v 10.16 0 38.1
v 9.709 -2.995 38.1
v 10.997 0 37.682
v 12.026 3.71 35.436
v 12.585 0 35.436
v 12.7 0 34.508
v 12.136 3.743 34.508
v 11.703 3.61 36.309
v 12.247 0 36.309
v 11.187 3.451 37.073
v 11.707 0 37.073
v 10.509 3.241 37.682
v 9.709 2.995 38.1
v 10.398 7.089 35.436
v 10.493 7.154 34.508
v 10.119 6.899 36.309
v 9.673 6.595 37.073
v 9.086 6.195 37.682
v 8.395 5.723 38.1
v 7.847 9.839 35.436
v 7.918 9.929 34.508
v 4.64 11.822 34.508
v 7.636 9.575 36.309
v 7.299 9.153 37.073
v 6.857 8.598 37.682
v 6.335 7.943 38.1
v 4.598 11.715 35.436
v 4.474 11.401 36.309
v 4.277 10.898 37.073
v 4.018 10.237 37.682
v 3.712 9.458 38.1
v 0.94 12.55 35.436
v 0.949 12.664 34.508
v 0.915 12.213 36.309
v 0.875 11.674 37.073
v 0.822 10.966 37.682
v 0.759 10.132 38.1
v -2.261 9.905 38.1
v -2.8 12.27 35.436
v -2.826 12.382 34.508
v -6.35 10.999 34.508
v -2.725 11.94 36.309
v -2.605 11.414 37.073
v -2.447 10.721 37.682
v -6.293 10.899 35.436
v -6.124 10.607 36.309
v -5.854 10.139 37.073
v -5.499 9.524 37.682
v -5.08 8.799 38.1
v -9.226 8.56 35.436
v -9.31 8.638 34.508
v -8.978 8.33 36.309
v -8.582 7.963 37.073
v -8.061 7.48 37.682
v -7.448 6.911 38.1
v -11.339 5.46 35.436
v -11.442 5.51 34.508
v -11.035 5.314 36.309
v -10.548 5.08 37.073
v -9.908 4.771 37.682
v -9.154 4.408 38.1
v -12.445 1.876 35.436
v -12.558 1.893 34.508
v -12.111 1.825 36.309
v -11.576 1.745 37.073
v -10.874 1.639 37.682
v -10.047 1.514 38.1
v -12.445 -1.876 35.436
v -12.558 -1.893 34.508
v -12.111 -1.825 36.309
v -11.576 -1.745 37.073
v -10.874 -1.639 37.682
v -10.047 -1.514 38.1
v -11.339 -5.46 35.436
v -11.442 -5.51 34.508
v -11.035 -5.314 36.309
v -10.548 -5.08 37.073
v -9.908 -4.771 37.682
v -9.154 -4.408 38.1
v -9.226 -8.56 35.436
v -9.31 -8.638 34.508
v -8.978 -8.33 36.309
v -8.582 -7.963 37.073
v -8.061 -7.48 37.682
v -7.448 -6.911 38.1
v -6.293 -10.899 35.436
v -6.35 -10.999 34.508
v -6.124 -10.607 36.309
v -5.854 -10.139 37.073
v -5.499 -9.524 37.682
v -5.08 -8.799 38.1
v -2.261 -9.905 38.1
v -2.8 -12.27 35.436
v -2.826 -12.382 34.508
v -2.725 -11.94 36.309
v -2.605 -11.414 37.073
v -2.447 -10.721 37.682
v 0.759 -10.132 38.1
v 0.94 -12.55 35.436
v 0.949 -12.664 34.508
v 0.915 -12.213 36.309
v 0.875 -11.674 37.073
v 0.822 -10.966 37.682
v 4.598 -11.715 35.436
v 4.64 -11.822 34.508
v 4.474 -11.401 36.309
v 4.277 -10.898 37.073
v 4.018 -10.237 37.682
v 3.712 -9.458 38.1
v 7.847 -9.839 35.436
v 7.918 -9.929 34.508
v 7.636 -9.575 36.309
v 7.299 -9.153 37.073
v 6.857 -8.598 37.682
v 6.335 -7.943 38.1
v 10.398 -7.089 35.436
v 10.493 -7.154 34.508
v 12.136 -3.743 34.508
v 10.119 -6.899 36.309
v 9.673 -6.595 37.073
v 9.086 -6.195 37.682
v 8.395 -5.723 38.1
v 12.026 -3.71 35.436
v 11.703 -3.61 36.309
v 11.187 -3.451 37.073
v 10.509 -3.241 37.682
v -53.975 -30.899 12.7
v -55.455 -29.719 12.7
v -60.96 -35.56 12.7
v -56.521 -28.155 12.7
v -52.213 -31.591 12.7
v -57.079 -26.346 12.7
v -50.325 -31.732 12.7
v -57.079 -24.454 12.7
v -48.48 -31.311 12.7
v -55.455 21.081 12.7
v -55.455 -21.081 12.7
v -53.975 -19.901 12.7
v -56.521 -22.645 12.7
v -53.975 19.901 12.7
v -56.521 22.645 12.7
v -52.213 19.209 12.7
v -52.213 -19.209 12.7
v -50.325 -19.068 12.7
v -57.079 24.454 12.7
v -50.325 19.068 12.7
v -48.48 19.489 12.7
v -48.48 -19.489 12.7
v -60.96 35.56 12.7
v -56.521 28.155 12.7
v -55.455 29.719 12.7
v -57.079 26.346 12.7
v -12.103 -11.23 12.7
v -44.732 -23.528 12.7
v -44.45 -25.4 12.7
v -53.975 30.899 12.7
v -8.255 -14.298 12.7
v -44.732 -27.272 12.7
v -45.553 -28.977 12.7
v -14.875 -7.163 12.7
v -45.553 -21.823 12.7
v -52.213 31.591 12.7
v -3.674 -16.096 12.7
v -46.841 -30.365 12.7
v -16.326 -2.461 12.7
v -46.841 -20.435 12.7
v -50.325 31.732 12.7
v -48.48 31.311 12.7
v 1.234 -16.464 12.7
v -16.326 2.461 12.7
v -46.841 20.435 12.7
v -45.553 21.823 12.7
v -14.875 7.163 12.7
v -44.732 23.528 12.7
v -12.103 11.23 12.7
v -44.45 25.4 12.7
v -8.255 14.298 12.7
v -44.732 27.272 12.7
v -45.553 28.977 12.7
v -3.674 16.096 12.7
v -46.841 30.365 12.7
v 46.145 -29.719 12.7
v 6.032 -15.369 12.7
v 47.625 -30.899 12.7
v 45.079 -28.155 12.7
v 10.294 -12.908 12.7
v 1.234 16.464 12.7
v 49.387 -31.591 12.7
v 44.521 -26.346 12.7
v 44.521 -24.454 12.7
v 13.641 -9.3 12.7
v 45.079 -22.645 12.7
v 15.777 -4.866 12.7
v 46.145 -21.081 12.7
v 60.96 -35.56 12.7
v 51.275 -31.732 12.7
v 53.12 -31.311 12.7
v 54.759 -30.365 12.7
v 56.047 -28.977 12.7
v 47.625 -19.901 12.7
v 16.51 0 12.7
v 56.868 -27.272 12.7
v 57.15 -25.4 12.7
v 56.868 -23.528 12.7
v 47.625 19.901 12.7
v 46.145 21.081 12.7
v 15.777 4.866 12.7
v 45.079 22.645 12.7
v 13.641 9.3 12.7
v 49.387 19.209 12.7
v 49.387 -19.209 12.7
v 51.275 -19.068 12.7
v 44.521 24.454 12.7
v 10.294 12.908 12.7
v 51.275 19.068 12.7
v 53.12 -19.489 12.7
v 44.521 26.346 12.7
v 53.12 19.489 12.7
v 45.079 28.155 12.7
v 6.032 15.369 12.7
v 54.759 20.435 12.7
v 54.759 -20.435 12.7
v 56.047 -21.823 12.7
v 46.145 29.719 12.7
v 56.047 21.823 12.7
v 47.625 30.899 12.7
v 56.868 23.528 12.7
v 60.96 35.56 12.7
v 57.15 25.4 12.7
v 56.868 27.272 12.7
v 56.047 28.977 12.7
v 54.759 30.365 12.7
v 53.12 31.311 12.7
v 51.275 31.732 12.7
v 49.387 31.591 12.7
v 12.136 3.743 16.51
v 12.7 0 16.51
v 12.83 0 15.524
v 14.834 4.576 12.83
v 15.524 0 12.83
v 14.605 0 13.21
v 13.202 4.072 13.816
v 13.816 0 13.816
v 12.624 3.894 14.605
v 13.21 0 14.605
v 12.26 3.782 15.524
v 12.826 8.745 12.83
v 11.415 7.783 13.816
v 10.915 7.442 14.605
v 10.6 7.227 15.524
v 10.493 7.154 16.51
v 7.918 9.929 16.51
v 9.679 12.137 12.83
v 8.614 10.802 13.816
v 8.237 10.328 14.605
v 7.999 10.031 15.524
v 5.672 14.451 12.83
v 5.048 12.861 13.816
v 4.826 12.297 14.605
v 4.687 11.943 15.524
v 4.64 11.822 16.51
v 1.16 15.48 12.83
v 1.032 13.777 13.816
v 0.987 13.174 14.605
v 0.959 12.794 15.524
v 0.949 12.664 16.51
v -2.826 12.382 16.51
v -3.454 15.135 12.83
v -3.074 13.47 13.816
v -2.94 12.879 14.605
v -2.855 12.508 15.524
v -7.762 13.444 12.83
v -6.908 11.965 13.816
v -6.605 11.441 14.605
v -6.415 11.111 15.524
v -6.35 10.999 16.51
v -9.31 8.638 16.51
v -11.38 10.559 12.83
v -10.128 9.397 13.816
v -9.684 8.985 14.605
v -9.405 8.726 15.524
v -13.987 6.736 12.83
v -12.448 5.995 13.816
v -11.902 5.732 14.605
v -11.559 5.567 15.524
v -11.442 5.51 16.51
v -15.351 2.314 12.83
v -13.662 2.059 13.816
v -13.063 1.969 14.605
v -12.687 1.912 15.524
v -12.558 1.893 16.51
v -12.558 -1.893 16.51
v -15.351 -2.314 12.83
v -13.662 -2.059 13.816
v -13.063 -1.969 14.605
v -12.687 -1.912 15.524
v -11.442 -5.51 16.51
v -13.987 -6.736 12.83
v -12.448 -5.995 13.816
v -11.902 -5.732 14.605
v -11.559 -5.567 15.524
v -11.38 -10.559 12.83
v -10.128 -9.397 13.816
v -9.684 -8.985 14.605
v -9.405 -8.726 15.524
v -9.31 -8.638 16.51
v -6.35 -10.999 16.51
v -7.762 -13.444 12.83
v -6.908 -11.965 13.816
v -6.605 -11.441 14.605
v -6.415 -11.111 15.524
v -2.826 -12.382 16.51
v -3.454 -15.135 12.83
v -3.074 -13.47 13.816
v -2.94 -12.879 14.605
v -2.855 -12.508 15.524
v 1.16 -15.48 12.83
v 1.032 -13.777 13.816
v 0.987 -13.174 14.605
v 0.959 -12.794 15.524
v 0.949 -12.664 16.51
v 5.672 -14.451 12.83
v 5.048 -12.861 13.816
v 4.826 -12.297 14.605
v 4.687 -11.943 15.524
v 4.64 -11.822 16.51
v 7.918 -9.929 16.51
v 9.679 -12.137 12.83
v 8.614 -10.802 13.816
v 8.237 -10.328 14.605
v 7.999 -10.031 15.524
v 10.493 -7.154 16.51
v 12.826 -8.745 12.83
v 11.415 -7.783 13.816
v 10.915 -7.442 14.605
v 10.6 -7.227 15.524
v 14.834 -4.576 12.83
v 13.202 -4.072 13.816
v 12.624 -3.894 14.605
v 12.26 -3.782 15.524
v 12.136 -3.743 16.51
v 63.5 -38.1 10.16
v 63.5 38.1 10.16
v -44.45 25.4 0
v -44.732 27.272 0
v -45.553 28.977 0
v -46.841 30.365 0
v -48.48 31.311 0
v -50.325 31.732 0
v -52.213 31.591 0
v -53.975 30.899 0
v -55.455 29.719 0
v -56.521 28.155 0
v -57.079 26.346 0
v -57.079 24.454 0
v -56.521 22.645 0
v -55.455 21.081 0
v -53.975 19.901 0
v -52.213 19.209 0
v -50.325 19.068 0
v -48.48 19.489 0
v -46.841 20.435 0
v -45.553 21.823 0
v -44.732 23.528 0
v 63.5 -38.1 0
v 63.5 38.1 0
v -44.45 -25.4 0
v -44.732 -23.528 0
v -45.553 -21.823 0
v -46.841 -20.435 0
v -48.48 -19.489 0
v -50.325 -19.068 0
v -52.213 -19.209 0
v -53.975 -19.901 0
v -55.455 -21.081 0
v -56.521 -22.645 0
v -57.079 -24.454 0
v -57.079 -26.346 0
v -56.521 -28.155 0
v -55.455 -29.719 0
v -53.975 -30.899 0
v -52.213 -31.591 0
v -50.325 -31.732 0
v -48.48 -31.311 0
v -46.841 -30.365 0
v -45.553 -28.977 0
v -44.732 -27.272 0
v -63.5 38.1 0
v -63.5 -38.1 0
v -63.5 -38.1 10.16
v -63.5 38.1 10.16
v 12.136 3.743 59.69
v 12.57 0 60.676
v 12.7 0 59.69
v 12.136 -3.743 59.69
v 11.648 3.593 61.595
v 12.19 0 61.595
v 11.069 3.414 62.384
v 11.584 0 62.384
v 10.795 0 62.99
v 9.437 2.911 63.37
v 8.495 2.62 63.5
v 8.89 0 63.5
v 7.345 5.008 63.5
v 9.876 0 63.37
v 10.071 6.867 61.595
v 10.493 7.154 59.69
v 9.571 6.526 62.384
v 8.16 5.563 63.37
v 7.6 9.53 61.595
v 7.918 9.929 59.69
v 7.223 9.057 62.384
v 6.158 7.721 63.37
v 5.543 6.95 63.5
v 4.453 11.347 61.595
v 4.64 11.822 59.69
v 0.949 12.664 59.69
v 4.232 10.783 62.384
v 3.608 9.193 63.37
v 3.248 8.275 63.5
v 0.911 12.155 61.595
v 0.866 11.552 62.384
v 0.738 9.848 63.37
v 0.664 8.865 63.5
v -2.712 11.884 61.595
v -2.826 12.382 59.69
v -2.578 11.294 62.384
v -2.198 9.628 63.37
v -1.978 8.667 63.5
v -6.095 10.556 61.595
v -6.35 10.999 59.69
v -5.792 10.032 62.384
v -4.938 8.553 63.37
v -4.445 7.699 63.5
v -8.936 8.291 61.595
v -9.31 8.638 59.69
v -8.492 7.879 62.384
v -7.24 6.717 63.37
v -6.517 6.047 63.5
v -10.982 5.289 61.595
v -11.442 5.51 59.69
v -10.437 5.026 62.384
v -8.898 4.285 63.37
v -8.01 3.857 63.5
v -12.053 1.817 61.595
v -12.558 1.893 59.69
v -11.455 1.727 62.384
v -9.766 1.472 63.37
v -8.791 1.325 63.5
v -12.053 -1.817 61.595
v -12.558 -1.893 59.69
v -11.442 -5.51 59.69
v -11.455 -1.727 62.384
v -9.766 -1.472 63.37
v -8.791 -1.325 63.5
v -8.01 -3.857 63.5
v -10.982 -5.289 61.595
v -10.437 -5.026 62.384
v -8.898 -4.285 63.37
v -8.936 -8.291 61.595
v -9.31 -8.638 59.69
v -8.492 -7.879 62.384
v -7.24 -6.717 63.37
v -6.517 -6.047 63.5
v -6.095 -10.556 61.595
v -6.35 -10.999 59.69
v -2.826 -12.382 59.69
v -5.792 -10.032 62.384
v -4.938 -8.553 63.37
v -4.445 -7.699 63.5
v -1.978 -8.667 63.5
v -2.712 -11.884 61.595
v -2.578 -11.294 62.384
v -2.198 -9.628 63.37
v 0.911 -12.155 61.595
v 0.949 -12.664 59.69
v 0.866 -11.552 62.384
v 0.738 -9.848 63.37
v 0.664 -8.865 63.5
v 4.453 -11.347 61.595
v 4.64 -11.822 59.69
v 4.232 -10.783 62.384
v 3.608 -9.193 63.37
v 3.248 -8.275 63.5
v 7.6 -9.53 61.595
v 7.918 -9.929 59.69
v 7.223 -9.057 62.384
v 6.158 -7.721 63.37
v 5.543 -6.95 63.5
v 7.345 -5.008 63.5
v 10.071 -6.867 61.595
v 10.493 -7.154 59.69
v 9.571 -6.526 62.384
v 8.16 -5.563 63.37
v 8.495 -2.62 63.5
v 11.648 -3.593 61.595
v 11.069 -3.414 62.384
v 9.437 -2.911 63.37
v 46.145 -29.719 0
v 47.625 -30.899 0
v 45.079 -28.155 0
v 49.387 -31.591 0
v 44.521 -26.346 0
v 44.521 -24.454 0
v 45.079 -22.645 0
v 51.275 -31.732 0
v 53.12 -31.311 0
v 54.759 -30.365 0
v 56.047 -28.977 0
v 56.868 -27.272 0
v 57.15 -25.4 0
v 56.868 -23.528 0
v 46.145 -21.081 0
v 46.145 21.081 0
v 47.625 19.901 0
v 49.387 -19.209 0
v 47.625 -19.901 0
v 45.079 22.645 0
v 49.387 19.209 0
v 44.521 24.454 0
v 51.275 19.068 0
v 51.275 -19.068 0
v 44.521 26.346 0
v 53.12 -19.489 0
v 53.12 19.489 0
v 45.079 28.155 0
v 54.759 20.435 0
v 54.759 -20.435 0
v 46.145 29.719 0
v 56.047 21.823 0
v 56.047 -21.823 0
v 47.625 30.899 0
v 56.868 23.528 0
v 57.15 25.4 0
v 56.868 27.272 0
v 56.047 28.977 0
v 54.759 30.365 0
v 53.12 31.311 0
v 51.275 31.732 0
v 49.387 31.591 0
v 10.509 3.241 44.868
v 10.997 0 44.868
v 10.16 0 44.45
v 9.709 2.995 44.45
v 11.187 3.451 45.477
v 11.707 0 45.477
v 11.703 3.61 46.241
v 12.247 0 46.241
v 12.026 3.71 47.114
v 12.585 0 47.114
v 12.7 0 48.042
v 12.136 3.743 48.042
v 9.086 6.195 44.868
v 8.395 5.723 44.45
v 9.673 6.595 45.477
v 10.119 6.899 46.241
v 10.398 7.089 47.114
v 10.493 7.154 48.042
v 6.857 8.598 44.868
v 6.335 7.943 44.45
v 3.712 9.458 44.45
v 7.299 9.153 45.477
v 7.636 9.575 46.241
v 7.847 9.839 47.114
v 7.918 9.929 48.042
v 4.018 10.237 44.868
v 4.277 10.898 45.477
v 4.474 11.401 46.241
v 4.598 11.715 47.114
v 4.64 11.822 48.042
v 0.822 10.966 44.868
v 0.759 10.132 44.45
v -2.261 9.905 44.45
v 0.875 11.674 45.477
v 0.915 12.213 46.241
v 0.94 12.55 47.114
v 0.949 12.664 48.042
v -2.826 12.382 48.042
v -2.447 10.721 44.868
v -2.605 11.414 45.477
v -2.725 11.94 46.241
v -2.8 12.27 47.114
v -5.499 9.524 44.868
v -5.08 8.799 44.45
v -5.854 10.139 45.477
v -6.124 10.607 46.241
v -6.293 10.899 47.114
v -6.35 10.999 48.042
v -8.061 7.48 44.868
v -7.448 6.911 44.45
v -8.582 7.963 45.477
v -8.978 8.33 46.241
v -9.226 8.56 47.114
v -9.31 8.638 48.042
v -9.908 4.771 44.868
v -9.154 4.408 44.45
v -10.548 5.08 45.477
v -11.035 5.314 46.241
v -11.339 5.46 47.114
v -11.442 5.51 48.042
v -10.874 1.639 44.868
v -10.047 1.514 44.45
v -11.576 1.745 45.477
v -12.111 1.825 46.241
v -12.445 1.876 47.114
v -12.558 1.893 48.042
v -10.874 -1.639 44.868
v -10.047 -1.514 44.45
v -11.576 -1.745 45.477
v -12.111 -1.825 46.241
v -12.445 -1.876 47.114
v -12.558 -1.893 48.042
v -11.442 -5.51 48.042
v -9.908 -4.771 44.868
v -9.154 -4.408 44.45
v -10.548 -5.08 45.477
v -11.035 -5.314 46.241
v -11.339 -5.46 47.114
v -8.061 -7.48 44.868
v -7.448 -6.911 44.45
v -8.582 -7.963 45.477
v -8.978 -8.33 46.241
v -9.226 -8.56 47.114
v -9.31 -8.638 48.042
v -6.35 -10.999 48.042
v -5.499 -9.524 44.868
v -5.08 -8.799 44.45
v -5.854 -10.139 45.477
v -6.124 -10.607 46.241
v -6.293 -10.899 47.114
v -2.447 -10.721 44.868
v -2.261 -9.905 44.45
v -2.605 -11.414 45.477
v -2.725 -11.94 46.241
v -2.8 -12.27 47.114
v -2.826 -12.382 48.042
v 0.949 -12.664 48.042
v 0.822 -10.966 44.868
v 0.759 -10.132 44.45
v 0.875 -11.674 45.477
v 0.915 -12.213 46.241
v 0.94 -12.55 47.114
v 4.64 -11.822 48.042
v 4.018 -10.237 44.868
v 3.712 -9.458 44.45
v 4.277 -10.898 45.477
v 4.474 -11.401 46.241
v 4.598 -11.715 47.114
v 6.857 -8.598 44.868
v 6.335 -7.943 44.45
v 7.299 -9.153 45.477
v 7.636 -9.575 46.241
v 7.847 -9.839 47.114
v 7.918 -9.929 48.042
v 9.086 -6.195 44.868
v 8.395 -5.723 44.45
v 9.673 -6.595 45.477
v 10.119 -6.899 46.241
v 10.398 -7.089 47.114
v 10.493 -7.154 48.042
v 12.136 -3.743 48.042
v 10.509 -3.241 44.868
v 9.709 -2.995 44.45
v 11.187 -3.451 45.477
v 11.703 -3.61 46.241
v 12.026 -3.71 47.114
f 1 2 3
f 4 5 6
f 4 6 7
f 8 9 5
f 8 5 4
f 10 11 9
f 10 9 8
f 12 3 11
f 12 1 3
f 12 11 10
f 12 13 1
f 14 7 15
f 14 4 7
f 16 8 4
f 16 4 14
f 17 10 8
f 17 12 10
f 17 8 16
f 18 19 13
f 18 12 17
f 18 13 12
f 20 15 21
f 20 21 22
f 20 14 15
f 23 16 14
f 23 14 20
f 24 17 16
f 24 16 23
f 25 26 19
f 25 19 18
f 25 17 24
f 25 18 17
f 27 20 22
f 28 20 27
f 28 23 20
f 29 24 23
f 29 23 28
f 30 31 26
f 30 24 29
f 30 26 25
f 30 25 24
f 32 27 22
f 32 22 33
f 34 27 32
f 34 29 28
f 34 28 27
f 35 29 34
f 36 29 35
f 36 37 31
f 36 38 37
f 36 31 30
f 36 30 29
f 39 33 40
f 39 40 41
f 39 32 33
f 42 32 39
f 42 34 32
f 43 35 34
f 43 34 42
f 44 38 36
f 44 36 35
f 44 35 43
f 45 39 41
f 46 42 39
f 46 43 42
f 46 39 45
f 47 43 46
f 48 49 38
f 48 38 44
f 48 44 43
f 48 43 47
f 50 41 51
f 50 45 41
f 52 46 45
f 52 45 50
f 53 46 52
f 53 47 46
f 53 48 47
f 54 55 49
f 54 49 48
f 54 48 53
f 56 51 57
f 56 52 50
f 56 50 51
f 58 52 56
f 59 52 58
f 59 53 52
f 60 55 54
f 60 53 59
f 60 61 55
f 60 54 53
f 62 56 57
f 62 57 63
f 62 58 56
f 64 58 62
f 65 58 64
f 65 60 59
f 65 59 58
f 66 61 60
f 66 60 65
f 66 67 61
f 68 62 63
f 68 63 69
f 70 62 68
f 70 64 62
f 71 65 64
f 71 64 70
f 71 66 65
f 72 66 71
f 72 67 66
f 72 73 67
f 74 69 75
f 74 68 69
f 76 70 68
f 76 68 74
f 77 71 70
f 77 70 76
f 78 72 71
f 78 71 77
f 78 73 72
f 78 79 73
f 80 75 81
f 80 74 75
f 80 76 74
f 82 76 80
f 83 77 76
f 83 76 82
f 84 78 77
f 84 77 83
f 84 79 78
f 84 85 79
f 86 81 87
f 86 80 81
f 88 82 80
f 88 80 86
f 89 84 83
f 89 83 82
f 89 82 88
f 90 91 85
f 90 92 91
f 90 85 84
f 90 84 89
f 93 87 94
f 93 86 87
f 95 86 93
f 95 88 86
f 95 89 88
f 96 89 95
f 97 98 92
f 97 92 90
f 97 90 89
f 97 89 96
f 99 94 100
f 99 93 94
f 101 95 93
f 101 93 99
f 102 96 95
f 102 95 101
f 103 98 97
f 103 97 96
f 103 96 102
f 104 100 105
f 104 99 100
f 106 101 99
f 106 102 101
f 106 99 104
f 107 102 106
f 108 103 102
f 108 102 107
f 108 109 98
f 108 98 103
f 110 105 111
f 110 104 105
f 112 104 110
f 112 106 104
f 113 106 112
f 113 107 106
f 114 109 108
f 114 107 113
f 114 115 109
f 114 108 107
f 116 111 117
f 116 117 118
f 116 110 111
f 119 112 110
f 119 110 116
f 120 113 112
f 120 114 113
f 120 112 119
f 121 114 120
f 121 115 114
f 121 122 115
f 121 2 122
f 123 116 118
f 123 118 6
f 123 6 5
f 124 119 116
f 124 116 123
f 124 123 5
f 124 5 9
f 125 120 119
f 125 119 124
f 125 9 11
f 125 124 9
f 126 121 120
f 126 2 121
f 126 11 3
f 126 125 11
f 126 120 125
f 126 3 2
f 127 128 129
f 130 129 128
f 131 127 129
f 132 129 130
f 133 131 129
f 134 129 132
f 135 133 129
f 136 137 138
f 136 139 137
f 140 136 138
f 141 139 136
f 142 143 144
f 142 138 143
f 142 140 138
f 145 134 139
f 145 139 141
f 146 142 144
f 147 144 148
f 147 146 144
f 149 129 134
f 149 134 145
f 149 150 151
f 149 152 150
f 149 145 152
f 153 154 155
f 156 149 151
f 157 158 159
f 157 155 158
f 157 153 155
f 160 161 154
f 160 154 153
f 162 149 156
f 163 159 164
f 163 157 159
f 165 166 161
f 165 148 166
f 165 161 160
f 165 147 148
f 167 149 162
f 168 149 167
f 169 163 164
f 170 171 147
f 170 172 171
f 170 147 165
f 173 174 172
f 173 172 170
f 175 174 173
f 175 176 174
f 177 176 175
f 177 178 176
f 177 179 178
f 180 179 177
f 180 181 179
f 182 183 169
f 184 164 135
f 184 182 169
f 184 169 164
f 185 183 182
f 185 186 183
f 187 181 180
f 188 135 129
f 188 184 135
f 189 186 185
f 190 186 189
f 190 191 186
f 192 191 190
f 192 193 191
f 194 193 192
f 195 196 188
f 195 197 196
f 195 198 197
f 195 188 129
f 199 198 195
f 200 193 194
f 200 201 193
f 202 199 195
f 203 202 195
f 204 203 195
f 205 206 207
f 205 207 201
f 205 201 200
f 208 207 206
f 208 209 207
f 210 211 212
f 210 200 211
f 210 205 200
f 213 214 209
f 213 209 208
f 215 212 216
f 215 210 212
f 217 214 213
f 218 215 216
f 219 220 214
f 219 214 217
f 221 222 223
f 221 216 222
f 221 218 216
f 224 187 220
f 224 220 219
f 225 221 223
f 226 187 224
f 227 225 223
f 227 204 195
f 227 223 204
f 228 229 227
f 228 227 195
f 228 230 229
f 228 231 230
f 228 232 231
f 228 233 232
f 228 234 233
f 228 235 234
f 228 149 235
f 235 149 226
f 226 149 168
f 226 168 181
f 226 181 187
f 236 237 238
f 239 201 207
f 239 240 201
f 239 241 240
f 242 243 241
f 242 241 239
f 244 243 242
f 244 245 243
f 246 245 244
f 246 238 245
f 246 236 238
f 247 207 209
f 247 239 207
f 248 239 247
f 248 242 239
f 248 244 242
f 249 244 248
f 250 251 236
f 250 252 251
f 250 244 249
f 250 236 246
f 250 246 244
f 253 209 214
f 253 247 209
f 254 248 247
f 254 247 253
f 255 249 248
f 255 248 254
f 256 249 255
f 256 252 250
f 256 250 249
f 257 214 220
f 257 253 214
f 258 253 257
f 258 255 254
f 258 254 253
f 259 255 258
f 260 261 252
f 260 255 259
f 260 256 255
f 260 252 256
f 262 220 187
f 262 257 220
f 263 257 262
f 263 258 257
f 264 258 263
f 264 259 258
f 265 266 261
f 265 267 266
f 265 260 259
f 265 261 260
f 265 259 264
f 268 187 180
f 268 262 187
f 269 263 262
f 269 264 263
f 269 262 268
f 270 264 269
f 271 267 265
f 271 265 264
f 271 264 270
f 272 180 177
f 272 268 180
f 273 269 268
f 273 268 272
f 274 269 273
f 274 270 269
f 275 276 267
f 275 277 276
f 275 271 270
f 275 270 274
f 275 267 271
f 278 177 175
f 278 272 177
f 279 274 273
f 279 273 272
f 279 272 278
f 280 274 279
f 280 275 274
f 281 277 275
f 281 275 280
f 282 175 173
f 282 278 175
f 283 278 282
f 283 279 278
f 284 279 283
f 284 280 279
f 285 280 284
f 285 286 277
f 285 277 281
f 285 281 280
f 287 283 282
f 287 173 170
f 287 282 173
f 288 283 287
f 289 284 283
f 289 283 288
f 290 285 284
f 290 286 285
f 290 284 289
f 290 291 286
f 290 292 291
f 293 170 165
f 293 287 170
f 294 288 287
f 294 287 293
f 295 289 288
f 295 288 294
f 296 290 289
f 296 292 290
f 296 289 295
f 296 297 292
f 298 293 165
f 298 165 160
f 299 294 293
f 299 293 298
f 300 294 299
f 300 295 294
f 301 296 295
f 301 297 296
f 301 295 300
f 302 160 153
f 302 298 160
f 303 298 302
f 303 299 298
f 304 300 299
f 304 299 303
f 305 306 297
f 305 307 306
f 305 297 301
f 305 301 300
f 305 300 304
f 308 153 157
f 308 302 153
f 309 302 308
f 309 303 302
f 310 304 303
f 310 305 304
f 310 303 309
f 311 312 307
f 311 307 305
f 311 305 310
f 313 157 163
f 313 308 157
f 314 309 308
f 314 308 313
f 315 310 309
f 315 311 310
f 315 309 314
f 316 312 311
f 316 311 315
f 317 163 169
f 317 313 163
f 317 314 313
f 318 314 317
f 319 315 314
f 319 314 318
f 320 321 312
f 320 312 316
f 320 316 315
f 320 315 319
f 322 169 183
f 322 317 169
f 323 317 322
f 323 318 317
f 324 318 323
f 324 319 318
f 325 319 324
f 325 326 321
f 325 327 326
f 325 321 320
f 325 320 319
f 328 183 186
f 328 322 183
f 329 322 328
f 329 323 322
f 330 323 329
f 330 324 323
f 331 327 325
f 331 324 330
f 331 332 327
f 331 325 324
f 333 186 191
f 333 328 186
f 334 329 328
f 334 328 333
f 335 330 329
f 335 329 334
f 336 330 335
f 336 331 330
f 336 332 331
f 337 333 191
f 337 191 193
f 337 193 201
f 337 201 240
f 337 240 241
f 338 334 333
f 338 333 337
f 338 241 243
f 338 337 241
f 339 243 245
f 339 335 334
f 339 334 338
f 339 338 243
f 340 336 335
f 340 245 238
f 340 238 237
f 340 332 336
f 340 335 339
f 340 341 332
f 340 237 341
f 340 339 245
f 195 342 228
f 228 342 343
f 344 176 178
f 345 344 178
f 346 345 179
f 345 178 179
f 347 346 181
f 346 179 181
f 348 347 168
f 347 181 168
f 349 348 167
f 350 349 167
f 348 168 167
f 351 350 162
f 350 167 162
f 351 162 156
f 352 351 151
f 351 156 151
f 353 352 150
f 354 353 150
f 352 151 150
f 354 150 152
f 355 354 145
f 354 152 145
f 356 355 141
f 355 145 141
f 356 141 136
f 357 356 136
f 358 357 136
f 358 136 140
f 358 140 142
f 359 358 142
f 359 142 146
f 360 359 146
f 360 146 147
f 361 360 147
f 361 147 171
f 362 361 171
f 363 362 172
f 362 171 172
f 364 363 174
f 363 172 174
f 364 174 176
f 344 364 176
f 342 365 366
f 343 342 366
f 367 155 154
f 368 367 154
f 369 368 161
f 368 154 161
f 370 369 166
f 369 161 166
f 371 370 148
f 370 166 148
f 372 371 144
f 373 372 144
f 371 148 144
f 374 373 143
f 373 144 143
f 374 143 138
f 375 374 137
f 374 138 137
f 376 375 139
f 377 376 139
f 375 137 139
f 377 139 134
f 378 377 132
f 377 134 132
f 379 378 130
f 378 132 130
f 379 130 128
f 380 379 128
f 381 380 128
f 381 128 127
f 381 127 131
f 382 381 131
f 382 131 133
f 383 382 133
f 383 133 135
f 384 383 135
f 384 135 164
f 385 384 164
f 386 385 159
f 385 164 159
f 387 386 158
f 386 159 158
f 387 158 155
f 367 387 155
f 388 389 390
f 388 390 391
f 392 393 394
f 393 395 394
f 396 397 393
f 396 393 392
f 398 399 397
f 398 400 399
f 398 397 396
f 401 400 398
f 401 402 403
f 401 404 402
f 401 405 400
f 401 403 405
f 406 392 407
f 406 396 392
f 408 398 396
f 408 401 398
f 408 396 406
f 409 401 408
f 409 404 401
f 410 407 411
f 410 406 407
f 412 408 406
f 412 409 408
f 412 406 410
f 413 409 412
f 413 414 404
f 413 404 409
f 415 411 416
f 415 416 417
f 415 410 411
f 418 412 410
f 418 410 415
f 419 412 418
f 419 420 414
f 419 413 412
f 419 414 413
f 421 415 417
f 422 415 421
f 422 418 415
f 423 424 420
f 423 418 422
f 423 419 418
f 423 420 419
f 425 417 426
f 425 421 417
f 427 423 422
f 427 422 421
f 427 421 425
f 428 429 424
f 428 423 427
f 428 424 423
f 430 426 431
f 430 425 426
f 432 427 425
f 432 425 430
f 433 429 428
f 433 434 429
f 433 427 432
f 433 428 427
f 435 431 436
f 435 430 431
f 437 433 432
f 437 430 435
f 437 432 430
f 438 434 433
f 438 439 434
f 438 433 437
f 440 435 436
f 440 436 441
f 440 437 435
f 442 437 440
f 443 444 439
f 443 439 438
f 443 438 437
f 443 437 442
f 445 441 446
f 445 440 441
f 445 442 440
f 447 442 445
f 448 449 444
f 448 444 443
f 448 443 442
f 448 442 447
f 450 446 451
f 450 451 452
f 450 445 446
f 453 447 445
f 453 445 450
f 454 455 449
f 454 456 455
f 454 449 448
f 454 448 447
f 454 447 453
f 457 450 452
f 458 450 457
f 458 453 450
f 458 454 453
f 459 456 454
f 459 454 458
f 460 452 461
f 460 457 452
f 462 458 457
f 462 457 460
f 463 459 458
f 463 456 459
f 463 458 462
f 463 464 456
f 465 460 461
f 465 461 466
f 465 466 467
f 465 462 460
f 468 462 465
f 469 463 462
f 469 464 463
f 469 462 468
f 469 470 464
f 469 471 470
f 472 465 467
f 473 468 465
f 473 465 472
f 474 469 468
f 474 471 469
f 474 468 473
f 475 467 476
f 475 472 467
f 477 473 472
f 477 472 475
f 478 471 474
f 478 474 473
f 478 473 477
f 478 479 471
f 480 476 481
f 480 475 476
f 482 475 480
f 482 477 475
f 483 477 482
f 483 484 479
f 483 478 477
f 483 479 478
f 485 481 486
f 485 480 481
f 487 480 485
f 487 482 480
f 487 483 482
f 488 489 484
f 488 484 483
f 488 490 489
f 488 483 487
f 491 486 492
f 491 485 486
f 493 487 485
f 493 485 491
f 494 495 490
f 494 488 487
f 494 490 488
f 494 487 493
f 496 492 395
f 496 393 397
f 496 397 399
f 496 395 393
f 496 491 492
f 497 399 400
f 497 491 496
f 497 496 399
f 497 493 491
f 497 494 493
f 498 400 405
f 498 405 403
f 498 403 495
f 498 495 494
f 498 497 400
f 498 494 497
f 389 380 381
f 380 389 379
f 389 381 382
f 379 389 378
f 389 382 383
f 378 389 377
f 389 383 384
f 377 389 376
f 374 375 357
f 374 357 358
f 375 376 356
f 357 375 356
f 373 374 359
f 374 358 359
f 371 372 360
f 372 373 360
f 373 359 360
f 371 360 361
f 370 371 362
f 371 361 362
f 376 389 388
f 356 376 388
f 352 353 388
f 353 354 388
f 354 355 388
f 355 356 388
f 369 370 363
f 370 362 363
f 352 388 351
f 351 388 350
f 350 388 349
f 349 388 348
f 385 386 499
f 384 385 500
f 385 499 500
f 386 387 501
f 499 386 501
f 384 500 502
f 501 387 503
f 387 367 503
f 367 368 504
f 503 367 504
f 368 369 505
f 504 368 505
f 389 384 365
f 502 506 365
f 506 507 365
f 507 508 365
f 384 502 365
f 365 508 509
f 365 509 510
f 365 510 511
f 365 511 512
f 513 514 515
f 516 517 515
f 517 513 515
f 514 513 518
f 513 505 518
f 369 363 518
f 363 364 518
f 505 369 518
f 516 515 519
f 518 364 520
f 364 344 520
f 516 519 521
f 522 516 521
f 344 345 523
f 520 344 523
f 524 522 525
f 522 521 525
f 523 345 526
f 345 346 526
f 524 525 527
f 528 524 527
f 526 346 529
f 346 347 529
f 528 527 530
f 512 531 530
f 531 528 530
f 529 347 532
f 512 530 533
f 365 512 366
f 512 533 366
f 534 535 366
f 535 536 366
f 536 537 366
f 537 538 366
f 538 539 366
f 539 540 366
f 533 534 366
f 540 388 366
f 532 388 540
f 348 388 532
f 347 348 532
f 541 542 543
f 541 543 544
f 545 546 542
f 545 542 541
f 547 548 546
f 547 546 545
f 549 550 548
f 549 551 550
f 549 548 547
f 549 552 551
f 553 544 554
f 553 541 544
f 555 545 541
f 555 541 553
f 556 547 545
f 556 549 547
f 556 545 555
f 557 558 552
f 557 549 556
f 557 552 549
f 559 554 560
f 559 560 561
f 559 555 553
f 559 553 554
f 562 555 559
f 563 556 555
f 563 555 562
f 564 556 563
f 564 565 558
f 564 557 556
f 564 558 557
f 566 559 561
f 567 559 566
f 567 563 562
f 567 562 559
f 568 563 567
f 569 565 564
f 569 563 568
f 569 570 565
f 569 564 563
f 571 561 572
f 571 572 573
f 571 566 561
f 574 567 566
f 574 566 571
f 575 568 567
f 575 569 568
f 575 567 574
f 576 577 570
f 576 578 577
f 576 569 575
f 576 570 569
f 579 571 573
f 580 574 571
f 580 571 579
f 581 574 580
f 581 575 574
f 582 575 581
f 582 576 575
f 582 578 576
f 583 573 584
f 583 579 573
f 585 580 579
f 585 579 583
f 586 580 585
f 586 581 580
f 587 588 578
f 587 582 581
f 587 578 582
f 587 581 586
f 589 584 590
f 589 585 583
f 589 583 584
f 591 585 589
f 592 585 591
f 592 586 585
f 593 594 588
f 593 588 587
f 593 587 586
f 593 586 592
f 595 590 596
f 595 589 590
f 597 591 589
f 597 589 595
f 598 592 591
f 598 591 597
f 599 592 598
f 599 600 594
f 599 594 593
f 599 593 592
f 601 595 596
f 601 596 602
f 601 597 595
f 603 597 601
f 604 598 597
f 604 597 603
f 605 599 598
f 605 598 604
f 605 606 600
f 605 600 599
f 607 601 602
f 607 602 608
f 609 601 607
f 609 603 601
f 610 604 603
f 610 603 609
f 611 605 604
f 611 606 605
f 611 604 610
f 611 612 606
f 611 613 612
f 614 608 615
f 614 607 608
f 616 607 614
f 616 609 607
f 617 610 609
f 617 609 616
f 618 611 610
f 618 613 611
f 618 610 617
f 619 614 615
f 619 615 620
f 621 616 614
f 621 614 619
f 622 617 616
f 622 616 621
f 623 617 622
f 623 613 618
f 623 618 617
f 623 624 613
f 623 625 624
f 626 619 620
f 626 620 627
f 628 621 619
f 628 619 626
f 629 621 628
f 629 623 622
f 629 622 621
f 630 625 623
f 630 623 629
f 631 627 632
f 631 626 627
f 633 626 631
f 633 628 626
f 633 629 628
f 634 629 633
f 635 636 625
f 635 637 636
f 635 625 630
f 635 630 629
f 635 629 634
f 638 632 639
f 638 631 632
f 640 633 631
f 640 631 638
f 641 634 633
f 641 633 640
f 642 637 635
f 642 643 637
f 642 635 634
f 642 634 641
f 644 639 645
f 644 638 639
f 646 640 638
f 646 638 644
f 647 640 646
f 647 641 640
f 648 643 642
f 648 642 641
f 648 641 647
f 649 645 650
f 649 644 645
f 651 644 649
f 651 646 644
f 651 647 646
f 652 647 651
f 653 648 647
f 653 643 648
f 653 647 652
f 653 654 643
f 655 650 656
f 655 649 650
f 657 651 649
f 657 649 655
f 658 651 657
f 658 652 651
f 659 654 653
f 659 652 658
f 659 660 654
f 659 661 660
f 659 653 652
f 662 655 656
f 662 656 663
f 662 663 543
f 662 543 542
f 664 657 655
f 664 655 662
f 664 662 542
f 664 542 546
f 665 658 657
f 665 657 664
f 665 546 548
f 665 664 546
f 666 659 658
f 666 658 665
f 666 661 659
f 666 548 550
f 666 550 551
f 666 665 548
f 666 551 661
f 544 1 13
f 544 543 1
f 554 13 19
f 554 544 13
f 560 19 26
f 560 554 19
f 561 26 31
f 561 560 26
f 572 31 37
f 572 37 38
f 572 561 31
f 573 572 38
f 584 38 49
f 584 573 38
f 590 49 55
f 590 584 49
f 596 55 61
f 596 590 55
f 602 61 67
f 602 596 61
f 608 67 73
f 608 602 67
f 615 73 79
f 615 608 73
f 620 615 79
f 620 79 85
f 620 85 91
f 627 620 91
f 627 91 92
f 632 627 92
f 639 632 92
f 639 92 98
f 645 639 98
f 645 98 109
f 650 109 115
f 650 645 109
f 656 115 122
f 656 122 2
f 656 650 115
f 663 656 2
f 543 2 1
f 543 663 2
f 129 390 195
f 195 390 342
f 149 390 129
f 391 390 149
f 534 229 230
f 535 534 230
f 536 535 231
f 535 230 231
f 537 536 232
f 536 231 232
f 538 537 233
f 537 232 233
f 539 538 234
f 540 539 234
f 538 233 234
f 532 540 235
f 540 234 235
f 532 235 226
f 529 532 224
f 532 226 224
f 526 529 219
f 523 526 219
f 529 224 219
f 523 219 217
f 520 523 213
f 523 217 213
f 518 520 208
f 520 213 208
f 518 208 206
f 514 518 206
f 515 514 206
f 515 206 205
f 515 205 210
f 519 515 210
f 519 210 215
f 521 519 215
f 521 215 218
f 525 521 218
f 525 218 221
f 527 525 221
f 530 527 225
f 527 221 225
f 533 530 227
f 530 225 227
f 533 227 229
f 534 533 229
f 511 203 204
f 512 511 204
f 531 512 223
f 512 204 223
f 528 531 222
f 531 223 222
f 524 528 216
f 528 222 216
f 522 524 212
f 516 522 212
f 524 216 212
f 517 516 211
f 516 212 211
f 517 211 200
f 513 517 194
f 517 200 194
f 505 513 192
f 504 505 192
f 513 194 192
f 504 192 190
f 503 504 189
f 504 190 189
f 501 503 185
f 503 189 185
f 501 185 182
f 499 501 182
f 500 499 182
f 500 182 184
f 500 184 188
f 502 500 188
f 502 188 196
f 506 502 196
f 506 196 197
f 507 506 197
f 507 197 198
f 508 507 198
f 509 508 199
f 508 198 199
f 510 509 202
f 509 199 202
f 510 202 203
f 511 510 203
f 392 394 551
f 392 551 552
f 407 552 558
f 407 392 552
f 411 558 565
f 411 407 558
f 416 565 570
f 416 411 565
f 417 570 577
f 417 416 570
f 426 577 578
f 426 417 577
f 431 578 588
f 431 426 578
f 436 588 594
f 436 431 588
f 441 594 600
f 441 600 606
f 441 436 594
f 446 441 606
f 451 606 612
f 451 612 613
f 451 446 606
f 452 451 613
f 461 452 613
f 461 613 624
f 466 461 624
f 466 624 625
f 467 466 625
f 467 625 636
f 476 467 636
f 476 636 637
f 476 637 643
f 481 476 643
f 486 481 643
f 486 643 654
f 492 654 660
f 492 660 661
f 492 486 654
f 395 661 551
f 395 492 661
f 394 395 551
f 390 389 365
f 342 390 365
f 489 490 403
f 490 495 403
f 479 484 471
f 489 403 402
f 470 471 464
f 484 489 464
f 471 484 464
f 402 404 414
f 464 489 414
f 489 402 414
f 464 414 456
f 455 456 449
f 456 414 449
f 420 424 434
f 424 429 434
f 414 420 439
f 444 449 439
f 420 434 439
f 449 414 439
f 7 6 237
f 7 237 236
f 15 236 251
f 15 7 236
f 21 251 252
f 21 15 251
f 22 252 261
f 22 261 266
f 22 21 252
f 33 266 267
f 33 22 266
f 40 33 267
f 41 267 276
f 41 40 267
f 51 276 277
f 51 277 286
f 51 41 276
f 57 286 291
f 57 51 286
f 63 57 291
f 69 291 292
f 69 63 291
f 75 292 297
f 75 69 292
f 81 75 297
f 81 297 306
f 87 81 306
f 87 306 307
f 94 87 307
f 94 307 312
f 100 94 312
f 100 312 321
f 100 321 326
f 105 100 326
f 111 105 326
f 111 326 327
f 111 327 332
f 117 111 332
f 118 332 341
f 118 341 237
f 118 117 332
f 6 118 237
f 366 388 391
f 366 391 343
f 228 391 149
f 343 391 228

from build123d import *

# Parameters (mm, degrees)
F0_W     = 127
F0_H     = 76.2
F1_DEPTH = 12.7
F2_R     = 6.35
F3_DEPTH = 12.7
F4_W     = 12.7
F4_H     = 50.8
F6_W     = 7.1040334281
F6_H     = 6.35
F9_SIZE  = 2.54


# Not quite as in the source:
# - a fillet or chamfer that OpenCascade refuses, or shapes differently, is made with other operations: its cross-section is extruded or revolved along the edge and cut away or added


with BuildPart() as f1:
    # F0 (on Top) → F1 (new body)
    with BuildSketch(Plane.XY):
        Rectangle(F0_W, F0_H)
    extrude(amount=F1_DEPTH)

    # F2 (on face) → F3 (cut, through all)
    with BuildSketch(Plane.XY.offset(12.7)):
        with Locations((-50.8, 25.4)):
            Circle(F2_R)
        with Locations((-50.8, -25.4)):
            Circle(F2_R)
        with Locations((50.8, -25.4)):
            Circle(F2_R)
        with Locations((50.8, 25.4)):
            Circle(F2_R)
    extrude(amount=-F3_DEPTH, mode=Mode.SUBTRACT)

    # F4 (on Front) → F5 (revolve)
    with BuildSketch(Plane.XZ):
        with Locations((6.35, 38.1)):
            Rectangle(F4_W, F4_H)
    revolve(axis=Axis((0, 0, 38.1), (0, 0, 1)))

    # F6 (on Front) → F7 (revolve, cut)
    with BuildSketch(Plane.XZ):
        with Locations((13.712016714, 41.275)):
            Rectangle(F6_W, F6_H)
    revolve(axis=Axis((0, 0, 12.7), (0, 0, 1)), mode=Mode.SUBTRACT)

    # F8: fillet of radius 3.81 on 4 edges, made by hand

    # F8_s1 → F8_t2 (revolve)
    with BuildSketch(Plane.XZ):
        with BuildLine():
            ThreePointArc((16.51, 12.7), (13.8159231637, 13.8159231637), (12.7, 16.51))
            Line((12.7, 16.51), (12.7, 12.7))
            Line((12.7, 12.7), (16.51, 12.7))
        make_face()
    revolve(axis=Axis((0, 0, 12.7), (0, 0, 1)))

    # F8_s3 → F8_t4 (revolve, cut)
    with BuildSketch(Plane.XZ):
        with BuildLine():
            ThreePointArc((12.7, 34.5078975516), (12.0008519733, 36.7076020772), (10.16, 38.1))
            Line((10.16, 38.1), (12.7, 38.1))
            Line((12.7, 38.1), (12.7, 34.5078975516))
        make_face()
    revolve(axis=Axis((0, 0, 38.1), (0, 0, 1)), mode=Mode.SUBTRACT)

    # F8_s5 → F8_t6 (revolve, cut)
    with BuildSketch(Plane.XZ):
        with BuildLine():
            ThreePointArc((10.16, 44.45), (12.0008519733, 45.8423979228), (12.7, 48.0421024484))
            Line((12.7, 48.0421024484), (12.7, 44.45))
            Line((12.7, 44.45), (10.16, 44.45))
        make_face()
    revolve(axis=Axis((0, 0, 44.45), (0, 0, 1)), mode=Mode.SUBTRACT)

    # F8_s7 → F8_t8 (revolve, cut)
    with BuildSketch(Plane.XZ):
        with BuildLine():
            ThreePointArc((12.7, 59.69), (11.5840768363, 62.3840768363), (8.89, 63.5))
            Line((8.89, 63.5), (12.7, 63.5))
            Line((12.7, 63.5), (12.7, 59.69))
        make_face()
    revolve(axis=Axis((0, 0, 63.5), (0, 0, 1)), mode=Mode.SUBTRACT)

    # F9
    f9_edges = [f1.edges().sort_by_distance(p)[0] for p in [
        (0, -38.1, 12.7),
        (-63.5, 0, 12.7),
        (63.5, 0, 12.7),
        (0, 38.1, 12.7),
    ]]
    chamfer(f9_edges, length=F9_SIZE)


solid = f1.part
